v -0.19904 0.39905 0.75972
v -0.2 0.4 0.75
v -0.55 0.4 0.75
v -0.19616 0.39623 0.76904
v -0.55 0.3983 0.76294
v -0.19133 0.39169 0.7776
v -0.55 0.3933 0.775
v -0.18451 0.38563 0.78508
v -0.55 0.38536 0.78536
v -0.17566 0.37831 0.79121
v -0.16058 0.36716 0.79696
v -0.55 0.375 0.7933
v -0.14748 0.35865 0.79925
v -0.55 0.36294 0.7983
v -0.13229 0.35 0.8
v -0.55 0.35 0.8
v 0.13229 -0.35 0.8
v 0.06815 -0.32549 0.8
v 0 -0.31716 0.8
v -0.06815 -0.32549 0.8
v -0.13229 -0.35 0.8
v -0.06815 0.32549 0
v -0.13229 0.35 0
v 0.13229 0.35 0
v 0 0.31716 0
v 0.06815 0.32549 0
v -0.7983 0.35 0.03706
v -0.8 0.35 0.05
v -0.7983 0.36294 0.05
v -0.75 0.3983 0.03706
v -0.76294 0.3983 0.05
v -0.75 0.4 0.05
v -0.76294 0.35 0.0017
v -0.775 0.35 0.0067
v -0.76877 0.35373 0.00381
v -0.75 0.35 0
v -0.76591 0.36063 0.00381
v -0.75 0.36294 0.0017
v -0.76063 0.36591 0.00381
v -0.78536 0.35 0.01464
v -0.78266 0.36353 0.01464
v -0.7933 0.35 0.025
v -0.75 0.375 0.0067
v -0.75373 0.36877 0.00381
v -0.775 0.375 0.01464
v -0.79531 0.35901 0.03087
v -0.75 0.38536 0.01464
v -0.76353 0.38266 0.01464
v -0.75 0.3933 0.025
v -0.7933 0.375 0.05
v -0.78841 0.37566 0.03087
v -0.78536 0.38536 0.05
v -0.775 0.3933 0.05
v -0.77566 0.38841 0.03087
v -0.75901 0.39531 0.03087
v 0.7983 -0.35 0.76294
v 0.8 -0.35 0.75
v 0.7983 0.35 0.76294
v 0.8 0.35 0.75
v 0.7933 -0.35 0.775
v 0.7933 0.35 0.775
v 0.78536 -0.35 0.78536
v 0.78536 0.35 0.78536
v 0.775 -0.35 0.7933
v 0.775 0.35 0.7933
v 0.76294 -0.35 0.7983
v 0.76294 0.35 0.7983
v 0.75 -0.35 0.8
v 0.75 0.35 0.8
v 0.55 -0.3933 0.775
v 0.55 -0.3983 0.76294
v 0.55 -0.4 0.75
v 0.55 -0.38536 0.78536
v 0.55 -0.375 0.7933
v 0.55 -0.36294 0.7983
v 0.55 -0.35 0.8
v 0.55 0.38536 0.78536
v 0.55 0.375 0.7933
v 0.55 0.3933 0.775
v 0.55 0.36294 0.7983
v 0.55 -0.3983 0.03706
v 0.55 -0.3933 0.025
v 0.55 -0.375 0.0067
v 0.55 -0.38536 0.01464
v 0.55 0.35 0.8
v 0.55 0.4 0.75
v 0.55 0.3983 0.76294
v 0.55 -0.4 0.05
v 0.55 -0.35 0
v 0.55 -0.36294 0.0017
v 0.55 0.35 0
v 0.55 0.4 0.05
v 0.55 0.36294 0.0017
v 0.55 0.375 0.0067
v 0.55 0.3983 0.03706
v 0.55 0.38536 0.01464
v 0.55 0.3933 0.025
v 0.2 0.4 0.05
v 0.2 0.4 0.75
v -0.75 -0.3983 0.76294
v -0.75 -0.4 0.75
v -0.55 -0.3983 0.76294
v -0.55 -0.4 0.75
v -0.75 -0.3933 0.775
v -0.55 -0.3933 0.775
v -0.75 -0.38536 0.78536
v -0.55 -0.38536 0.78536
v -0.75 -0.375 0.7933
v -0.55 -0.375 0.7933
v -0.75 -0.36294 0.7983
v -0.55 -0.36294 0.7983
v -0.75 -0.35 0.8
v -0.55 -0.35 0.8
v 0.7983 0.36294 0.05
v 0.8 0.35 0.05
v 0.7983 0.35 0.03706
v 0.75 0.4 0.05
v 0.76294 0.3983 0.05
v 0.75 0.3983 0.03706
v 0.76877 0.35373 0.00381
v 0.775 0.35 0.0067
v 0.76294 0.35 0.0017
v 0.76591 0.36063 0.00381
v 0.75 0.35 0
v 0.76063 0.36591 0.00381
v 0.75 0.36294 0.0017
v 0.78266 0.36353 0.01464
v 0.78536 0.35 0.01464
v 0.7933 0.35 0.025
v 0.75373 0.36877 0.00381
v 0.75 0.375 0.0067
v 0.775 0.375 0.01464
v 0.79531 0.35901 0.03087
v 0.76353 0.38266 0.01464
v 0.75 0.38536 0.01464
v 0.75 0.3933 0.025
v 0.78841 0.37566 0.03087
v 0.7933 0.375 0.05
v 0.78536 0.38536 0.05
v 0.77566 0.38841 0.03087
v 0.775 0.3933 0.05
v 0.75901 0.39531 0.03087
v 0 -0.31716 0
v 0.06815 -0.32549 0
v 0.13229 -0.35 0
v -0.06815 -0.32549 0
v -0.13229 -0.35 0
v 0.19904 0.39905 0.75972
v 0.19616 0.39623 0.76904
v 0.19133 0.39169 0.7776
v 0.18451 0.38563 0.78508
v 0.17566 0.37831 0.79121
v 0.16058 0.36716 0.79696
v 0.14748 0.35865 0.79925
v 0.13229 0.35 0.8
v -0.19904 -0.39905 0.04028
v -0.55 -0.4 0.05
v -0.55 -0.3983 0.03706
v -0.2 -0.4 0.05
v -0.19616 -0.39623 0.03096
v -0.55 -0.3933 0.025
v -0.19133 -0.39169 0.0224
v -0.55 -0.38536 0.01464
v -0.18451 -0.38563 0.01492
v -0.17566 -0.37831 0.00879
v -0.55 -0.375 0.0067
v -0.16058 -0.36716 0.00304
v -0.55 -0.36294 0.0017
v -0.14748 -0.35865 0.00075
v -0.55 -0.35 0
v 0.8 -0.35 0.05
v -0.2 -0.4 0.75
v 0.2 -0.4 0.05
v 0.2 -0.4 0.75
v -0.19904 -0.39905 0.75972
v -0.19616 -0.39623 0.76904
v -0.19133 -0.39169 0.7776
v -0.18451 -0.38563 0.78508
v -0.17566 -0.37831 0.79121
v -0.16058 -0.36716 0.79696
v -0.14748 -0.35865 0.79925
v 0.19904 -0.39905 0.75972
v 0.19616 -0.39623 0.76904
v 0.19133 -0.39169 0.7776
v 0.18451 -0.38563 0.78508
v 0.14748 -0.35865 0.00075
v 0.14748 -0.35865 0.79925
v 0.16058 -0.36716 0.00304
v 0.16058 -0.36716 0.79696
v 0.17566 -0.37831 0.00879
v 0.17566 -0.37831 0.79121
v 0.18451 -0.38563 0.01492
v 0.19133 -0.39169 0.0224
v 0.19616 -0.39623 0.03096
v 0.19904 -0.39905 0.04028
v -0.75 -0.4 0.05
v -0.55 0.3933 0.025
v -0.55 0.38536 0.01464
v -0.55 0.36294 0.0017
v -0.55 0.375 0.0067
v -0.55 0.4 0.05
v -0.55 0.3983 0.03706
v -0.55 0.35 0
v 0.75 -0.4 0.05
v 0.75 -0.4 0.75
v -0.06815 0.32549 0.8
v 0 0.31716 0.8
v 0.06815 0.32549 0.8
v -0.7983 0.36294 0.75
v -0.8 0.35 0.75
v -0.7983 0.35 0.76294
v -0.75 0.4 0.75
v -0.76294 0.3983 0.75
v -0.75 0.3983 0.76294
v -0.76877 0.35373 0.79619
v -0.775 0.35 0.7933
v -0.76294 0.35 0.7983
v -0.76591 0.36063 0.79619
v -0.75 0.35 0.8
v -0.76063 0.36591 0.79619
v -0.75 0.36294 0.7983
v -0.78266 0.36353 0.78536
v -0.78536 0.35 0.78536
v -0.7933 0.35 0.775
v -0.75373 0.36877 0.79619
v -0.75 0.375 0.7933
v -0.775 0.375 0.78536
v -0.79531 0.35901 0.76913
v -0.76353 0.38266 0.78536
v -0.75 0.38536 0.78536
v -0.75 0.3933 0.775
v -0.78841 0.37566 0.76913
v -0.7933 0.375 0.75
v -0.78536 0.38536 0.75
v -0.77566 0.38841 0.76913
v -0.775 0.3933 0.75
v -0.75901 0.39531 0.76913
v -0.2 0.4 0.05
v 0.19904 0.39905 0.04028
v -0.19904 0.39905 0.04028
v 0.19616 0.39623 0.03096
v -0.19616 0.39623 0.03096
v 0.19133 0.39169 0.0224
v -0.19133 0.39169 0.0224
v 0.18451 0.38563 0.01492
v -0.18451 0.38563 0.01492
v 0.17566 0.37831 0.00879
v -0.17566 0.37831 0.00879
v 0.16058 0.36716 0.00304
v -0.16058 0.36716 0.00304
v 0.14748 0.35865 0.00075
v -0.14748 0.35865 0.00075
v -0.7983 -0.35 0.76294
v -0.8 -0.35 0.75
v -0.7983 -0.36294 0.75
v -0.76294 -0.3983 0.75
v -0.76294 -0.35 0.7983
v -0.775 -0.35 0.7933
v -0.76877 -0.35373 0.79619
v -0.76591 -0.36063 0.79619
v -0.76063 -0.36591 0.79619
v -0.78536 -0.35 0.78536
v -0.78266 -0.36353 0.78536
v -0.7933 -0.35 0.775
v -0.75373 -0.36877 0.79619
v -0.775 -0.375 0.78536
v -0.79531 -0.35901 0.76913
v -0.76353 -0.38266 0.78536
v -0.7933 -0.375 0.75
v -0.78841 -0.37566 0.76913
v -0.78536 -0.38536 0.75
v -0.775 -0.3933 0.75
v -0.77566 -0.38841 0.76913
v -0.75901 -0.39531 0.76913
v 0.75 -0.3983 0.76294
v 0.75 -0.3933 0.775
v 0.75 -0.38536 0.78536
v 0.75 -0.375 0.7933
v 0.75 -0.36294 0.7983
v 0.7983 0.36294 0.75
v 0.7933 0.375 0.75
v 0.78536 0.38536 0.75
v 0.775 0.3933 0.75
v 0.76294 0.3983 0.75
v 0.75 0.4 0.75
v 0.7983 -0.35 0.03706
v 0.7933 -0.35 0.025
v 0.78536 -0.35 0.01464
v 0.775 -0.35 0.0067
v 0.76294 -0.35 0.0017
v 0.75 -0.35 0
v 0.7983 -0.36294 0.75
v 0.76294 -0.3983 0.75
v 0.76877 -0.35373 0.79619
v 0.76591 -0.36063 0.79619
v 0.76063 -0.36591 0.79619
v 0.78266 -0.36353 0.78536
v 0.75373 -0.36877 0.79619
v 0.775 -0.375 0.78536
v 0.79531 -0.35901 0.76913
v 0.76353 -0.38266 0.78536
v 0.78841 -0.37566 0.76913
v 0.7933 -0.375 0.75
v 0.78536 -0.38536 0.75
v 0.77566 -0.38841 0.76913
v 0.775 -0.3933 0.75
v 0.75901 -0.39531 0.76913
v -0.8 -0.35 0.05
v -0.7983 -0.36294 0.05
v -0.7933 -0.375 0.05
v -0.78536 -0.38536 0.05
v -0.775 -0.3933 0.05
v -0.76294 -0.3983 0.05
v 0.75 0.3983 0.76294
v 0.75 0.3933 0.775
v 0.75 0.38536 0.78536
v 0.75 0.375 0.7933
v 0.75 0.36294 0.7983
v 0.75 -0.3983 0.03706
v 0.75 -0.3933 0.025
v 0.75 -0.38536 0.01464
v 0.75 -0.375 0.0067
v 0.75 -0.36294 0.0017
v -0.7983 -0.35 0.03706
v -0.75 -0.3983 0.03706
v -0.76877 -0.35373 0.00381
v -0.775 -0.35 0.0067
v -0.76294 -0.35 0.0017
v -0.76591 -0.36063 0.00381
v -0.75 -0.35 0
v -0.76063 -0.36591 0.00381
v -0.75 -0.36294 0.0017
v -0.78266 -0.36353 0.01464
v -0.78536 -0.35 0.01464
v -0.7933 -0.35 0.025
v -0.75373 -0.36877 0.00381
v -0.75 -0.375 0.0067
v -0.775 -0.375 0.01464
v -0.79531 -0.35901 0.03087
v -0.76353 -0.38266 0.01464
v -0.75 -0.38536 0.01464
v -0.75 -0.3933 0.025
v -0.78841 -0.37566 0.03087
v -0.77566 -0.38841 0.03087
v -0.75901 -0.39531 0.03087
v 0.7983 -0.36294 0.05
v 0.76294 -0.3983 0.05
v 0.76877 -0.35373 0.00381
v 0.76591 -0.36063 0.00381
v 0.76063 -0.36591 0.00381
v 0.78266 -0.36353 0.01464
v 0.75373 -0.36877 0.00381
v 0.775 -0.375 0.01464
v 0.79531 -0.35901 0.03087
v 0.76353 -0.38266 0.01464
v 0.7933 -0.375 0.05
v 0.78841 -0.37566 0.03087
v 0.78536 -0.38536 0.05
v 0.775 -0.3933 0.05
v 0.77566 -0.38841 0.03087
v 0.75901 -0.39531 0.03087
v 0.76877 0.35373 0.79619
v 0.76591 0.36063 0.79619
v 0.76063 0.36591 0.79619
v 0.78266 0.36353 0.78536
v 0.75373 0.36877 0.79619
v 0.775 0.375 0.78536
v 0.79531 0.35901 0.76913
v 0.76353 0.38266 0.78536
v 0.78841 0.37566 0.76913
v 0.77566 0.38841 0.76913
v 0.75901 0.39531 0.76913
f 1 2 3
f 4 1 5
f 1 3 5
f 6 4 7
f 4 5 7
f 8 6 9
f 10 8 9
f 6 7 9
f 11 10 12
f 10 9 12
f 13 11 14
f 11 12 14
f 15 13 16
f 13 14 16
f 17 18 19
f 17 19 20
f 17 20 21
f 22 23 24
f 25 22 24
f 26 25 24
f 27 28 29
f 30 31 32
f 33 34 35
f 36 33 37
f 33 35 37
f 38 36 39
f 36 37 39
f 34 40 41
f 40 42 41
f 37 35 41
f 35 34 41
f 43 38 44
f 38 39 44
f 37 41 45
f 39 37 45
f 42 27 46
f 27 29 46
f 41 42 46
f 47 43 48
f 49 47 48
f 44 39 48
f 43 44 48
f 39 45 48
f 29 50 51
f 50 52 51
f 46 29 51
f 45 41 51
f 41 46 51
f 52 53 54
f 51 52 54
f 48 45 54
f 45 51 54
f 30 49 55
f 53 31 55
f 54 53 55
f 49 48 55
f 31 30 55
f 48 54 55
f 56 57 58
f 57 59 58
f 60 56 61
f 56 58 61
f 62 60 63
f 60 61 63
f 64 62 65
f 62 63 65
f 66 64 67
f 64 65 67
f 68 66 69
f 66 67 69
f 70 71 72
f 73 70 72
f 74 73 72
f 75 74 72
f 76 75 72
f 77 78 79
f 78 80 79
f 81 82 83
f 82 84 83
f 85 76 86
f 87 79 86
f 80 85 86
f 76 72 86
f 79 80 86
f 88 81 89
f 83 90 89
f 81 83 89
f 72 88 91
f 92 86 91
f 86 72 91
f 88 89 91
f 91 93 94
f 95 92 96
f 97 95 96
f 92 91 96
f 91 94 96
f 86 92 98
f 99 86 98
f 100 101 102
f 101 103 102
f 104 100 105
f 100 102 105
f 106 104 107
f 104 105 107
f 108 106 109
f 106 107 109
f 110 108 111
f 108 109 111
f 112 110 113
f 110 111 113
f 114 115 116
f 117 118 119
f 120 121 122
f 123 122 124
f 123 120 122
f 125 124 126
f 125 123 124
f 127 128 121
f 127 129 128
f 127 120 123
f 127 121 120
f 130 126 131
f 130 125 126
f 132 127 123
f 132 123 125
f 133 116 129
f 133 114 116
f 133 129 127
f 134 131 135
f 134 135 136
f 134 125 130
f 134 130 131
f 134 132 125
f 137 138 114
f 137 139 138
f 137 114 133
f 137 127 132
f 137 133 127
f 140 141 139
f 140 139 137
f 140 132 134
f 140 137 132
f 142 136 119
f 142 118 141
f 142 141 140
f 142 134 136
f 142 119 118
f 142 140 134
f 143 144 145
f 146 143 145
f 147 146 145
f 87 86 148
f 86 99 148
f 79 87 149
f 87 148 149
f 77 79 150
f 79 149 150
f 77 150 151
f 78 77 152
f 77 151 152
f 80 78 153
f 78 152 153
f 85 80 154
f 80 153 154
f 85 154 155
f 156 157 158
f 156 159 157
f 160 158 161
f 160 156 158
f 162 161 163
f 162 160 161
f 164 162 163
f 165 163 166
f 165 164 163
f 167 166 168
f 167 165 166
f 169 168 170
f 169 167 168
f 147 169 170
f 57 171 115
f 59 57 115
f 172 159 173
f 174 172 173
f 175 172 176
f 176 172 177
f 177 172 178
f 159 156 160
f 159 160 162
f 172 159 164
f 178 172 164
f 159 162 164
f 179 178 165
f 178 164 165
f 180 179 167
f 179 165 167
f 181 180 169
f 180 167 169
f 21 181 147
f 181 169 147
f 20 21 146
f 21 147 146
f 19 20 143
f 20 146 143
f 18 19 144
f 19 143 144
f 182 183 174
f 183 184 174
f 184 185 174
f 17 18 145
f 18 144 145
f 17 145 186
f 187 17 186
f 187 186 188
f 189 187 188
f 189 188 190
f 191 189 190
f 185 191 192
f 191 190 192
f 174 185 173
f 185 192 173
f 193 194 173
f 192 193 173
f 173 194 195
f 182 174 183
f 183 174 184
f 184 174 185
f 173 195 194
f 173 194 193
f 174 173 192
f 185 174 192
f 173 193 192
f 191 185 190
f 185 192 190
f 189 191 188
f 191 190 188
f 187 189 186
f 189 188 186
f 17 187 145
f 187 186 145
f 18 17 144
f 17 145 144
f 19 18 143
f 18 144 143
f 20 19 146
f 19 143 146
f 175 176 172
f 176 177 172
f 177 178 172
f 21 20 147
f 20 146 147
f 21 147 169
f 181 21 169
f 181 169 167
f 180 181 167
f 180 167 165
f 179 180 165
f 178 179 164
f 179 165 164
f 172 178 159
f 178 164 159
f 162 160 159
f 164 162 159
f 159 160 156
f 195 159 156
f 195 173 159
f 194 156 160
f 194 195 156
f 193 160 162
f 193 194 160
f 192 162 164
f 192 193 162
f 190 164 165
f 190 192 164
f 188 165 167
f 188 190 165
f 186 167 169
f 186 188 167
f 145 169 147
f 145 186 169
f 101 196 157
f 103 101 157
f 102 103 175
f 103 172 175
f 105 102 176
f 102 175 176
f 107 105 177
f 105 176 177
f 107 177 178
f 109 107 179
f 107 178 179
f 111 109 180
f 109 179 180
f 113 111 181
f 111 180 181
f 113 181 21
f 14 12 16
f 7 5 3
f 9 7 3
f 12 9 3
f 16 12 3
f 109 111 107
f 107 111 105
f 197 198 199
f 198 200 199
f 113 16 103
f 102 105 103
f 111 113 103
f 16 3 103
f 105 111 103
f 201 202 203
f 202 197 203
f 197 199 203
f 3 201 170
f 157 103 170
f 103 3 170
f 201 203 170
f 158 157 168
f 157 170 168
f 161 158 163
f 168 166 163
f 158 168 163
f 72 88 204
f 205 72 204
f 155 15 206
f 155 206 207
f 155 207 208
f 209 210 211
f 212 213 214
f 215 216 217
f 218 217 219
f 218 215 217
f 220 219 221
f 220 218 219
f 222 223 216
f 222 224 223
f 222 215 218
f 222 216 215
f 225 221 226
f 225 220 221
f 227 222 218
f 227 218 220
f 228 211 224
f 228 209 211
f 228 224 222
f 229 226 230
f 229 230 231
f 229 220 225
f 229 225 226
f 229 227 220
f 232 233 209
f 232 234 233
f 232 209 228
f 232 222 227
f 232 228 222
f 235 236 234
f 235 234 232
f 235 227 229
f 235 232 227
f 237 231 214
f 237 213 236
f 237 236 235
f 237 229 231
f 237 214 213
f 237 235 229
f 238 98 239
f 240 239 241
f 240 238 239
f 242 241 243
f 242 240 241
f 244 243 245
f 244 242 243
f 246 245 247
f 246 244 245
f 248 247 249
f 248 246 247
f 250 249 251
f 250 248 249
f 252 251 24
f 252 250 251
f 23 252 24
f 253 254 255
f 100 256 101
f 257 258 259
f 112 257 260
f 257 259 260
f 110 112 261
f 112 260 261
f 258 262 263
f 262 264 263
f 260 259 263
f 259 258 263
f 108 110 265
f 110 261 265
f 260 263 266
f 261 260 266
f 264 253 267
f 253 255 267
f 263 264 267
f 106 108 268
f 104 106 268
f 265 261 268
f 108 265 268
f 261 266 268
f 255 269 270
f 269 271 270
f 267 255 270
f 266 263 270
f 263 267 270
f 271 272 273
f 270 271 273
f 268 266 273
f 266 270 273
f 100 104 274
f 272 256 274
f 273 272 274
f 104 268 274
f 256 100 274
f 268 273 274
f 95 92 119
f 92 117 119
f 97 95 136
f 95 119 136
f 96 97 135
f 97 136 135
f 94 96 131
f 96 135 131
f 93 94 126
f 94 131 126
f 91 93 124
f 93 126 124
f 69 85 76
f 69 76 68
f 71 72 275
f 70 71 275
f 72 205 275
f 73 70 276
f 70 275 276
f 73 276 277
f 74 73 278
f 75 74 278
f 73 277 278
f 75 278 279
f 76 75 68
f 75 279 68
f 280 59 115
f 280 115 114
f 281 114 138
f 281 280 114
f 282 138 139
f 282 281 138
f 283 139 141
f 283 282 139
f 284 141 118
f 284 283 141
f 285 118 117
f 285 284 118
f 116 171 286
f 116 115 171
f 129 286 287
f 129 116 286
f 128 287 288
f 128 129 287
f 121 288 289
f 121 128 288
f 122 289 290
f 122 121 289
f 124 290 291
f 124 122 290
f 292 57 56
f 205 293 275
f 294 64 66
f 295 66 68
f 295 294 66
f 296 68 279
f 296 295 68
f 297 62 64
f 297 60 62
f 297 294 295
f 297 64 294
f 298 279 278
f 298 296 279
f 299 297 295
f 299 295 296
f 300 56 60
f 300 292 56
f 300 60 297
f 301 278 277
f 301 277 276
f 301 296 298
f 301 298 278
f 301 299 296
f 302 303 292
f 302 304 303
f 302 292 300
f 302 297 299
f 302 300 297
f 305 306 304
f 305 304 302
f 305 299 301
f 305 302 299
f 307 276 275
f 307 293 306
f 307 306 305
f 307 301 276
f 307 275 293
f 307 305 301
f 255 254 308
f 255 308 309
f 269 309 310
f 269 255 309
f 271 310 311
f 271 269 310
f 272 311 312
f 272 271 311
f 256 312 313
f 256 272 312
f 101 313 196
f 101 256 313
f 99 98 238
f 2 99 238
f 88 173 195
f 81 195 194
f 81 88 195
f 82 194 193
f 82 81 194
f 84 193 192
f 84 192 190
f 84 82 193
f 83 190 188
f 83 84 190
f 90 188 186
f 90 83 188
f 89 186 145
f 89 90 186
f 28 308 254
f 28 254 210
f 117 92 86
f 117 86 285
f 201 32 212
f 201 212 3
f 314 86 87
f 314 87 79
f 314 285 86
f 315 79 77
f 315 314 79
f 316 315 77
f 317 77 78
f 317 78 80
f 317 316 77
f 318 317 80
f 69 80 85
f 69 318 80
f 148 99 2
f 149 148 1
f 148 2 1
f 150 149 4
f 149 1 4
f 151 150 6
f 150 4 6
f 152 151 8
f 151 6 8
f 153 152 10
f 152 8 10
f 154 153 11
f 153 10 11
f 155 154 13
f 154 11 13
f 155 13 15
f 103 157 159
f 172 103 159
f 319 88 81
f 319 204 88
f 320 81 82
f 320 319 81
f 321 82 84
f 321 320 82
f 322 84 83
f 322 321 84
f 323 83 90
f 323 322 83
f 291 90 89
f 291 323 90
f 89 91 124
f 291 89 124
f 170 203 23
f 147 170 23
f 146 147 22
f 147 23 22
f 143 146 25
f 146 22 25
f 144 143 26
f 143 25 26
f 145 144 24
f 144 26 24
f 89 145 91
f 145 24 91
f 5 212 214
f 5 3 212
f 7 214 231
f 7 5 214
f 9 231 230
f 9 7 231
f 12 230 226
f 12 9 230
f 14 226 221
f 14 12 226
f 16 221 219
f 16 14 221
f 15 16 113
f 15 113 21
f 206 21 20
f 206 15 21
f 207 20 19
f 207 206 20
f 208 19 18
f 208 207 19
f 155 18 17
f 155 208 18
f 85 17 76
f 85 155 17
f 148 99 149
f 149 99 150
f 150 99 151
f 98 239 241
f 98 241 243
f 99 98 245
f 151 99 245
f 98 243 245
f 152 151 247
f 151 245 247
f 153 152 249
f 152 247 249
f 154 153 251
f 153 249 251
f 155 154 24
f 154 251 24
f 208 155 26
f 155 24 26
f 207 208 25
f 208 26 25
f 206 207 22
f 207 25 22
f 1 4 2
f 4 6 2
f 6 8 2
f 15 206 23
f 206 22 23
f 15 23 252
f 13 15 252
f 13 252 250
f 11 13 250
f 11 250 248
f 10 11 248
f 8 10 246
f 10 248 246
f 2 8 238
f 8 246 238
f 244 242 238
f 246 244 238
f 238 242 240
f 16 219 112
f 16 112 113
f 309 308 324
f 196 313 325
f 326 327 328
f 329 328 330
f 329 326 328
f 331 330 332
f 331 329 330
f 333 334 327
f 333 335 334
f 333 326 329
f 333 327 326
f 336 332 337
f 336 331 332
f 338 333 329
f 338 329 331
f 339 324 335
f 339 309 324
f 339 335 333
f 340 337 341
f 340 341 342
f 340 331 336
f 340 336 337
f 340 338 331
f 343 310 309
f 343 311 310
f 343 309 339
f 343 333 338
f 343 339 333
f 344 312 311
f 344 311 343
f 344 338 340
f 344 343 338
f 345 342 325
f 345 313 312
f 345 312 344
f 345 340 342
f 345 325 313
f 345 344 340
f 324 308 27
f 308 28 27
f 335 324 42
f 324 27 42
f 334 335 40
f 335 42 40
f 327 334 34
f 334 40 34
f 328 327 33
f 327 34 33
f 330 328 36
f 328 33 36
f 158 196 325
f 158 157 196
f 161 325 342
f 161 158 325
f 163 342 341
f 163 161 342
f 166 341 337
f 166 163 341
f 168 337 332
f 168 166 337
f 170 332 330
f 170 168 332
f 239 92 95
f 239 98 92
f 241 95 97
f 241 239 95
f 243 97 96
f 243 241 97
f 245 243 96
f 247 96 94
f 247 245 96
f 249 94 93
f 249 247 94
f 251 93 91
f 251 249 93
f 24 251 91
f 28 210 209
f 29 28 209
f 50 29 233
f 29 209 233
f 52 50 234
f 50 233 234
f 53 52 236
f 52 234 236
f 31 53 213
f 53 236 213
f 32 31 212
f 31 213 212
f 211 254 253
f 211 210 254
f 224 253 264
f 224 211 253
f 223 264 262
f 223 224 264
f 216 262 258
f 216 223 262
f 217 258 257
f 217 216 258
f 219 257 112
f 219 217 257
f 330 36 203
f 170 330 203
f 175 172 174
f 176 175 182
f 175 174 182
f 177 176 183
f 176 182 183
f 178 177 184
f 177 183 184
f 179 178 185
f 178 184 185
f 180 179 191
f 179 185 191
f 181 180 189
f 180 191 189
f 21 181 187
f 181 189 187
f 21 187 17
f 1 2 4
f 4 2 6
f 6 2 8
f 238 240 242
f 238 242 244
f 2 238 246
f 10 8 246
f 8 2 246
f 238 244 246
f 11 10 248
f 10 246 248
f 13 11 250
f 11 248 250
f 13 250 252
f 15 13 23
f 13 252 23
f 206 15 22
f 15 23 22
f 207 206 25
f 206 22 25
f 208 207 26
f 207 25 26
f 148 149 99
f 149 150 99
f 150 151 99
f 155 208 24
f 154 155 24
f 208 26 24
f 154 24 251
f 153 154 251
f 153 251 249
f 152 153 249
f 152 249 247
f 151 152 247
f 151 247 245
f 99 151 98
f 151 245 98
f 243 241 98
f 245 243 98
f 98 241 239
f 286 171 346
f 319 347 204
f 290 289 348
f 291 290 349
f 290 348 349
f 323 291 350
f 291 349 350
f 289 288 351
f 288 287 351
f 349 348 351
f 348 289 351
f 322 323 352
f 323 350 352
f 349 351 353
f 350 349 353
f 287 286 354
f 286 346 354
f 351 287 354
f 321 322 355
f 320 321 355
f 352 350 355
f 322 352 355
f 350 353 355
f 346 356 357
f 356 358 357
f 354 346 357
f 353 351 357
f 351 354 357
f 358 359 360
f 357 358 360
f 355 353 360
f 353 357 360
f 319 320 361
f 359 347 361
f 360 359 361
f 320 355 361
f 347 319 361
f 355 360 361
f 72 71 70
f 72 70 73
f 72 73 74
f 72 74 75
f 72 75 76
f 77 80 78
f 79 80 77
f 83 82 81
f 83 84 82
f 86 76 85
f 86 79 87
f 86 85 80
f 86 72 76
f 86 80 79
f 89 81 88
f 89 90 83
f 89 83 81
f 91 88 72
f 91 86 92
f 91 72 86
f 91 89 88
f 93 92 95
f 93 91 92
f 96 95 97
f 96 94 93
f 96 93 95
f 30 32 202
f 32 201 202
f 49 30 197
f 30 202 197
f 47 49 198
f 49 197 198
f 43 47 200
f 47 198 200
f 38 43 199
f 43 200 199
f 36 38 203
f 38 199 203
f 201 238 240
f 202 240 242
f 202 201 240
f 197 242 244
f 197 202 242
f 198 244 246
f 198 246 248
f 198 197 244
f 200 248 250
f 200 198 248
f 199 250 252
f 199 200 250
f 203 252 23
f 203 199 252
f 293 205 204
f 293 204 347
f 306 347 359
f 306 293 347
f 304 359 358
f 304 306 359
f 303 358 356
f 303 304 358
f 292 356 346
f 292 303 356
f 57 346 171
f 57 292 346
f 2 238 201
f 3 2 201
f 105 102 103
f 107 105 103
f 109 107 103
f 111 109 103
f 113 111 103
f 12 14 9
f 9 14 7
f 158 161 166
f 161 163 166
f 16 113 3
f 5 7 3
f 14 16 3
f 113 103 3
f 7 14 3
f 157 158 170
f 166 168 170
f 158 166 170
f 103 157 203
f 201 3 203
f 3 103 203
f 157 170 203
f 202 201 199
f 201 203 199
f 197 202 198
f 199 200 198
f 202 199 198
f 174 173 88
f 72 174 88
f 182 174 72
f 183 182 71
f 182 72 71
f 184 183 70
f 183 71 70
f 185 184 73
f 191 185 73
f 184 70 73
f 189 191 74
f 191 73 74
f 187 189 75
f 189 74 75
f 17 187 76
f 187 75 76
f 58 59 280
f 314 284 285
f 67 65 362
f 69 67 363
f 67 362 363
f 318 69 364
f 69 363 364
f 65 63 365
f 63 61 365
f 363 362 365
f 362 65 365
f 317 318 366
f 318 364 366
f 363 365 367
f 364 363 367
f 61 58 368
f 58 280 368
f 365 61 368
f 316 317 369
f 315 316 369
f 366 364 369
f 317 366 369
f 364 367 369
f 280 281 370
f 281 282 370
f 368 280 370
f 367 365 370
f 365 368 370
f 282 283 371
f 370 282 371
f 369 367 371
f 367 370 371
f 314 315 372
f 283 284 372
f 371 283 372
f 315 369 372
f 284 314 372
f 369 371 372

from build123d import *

# Parameters (mm, degrees)
F2_DEPTH = 0.8
F1_W     = 0.25
F1_H     = 0.8
F3_DEPTH = 0.8
F4_DEPTH = 0.8
F5_R     = 0.05
F5_2_R   = 0.05
F5_3_R   = 0.05
F5_4_R   = 0.05
F5_5_R   = 0.05


with BuildPart() as f2:
    # F1 (on Top) → F2 (new body)
    with BuildSketch(Plane.XY):
        with BuildLine():
            Line((0.55, -0.4), (0.55, 0.4))
            Line((0.55, 0.4), (0.2, 0.4))
            ThreePointArc((0.2, 0.4), (0, 0.3171572875), (-0.2, 0.4))
            Line((-0.2, 0.4), (-0.55, 0.4))
            Line((-0.55, 0.4), (-0.55, -0.4))
            Line((-0.55, -0.4), (-0.2, -0.4))
            ThreePointArc((-0.2, -0.4), (0, -0.3171572875), (0.2, -0.4))
            Line((0.2, -0.4), (0.55, -0.4))
        make_face()
    extrude(amount=F2_DEPTH)

    # F5#3
    f5_3_edges = [f2.edges().sort_by_distance(p)[0] for p in [
        (-0.375, 0.4, 0.8),
        (0.375, 0.4, 0.8),
        (0.375, -0.4, 0.8),
        (-0.375, -0.4, 0.8),
        (-0.375, 0.4, 0),
        (0.375, 0.4, 0),
        (-0.375, -0.4, 0),
        (0.375, -0.4, 0),
    ]]
    fillet(f5_3_edges, radius=F5_3_R)


with BuildPart() as f3:
    # F1 (on Top) → F3 (new body)
    with BuildSketch(Plane.XY):
        with Locations((-0.675, 0)):
            Rectangle(F1_W, F1_H)
    extrude(amount=F3_DEPTH)

    # F5
    f5_edges = [f3.edges().sort_by_distance(p)[0] for p in [
        (-0.8, 0.4, 0.4),
        (-0.8, -0.4, 0.4),
        (-0.8, 0, 0),
        (-0.8, 0, 0.8),
        (-0.675, 0.4, 0.8),
        (-0.675, -0.4, 0.8),
        (-0.675, -0.4, 0),
        (-0.675, 0.4, 0),
    ]]
    fillet(f5_edges, radius=F5_R)


with BuildPart() as f3b:
    # F1 (on Top) → F3, piece 2 (new body)
    with BuildSketch(Plane.XY):
        with Locations((0.675, 0)):
            Rectangle(F1_W, F1_H)
    extrude(amount=F3_DEPTH)

    # F5#2
    f5_2_edges = [f3b.edges().sort_by_distance(p)[0] for p in [
        (0.8, -0.4, 0.4),
        (0.8, 0.4, 0.4),
        (0.8, 0, 0),
        (0.8, 0, 0.8),
        (0.675, 0.4, 0.8),
        (0.675, -0.4, 0.8),
        (0.675, 0.4, 0),
        (0.675, -0.4, 0),
    ]]
    fillet(f5_2_edges, radius=F5_2_R)


with BuildPart() as f4:
    # F1 (on Top) → F4 (new body)
    with BuildSketch(Plane.XY):
        with BuildLine():
            Line((-0.2, -0.4), (0.2, -0.4))
            ThreePointArc((0.2, -0.4), (0, -0.3171572875), (-0.2, -0.4))
        make_face()
    extrude(amount=F4_DEPTH)

    # F5#5
    f5_5_edges = [f4.edges().sort_by_distance(p)[0] for p in [
        (0, -0.4, 0.8),
        (0, -0.4, 0),
    ]]
    fillet(f5_5_edges, radius=F5_5_R)


with BuildPart() as f4b:
    # F1 (on Top) → F4, piece 2 (new body)
    with BuildSketch(Plane.XY):
        with BuildLine():
            ThreePointArc((-0.2, 0.4), (0, 0.3171572875), (0.2, 0.4))
            Line((0.2, 0.4), (-0.2, 0.4))
        make_face()
    extrude(amount=F4_DEPTH)

    # F5#4
    f5_4_edges = [f4b.edges().sort_by_distance(p)[0] for p in [
        (0, 0.4, 0.8),
        (0, 0.4, 0),
    ]]
    fillet(f5_4_edges, radius=F5_4_R)


solid = Compound([f2.part, f3.part, f3b.part, f4.part, f4b.part])
